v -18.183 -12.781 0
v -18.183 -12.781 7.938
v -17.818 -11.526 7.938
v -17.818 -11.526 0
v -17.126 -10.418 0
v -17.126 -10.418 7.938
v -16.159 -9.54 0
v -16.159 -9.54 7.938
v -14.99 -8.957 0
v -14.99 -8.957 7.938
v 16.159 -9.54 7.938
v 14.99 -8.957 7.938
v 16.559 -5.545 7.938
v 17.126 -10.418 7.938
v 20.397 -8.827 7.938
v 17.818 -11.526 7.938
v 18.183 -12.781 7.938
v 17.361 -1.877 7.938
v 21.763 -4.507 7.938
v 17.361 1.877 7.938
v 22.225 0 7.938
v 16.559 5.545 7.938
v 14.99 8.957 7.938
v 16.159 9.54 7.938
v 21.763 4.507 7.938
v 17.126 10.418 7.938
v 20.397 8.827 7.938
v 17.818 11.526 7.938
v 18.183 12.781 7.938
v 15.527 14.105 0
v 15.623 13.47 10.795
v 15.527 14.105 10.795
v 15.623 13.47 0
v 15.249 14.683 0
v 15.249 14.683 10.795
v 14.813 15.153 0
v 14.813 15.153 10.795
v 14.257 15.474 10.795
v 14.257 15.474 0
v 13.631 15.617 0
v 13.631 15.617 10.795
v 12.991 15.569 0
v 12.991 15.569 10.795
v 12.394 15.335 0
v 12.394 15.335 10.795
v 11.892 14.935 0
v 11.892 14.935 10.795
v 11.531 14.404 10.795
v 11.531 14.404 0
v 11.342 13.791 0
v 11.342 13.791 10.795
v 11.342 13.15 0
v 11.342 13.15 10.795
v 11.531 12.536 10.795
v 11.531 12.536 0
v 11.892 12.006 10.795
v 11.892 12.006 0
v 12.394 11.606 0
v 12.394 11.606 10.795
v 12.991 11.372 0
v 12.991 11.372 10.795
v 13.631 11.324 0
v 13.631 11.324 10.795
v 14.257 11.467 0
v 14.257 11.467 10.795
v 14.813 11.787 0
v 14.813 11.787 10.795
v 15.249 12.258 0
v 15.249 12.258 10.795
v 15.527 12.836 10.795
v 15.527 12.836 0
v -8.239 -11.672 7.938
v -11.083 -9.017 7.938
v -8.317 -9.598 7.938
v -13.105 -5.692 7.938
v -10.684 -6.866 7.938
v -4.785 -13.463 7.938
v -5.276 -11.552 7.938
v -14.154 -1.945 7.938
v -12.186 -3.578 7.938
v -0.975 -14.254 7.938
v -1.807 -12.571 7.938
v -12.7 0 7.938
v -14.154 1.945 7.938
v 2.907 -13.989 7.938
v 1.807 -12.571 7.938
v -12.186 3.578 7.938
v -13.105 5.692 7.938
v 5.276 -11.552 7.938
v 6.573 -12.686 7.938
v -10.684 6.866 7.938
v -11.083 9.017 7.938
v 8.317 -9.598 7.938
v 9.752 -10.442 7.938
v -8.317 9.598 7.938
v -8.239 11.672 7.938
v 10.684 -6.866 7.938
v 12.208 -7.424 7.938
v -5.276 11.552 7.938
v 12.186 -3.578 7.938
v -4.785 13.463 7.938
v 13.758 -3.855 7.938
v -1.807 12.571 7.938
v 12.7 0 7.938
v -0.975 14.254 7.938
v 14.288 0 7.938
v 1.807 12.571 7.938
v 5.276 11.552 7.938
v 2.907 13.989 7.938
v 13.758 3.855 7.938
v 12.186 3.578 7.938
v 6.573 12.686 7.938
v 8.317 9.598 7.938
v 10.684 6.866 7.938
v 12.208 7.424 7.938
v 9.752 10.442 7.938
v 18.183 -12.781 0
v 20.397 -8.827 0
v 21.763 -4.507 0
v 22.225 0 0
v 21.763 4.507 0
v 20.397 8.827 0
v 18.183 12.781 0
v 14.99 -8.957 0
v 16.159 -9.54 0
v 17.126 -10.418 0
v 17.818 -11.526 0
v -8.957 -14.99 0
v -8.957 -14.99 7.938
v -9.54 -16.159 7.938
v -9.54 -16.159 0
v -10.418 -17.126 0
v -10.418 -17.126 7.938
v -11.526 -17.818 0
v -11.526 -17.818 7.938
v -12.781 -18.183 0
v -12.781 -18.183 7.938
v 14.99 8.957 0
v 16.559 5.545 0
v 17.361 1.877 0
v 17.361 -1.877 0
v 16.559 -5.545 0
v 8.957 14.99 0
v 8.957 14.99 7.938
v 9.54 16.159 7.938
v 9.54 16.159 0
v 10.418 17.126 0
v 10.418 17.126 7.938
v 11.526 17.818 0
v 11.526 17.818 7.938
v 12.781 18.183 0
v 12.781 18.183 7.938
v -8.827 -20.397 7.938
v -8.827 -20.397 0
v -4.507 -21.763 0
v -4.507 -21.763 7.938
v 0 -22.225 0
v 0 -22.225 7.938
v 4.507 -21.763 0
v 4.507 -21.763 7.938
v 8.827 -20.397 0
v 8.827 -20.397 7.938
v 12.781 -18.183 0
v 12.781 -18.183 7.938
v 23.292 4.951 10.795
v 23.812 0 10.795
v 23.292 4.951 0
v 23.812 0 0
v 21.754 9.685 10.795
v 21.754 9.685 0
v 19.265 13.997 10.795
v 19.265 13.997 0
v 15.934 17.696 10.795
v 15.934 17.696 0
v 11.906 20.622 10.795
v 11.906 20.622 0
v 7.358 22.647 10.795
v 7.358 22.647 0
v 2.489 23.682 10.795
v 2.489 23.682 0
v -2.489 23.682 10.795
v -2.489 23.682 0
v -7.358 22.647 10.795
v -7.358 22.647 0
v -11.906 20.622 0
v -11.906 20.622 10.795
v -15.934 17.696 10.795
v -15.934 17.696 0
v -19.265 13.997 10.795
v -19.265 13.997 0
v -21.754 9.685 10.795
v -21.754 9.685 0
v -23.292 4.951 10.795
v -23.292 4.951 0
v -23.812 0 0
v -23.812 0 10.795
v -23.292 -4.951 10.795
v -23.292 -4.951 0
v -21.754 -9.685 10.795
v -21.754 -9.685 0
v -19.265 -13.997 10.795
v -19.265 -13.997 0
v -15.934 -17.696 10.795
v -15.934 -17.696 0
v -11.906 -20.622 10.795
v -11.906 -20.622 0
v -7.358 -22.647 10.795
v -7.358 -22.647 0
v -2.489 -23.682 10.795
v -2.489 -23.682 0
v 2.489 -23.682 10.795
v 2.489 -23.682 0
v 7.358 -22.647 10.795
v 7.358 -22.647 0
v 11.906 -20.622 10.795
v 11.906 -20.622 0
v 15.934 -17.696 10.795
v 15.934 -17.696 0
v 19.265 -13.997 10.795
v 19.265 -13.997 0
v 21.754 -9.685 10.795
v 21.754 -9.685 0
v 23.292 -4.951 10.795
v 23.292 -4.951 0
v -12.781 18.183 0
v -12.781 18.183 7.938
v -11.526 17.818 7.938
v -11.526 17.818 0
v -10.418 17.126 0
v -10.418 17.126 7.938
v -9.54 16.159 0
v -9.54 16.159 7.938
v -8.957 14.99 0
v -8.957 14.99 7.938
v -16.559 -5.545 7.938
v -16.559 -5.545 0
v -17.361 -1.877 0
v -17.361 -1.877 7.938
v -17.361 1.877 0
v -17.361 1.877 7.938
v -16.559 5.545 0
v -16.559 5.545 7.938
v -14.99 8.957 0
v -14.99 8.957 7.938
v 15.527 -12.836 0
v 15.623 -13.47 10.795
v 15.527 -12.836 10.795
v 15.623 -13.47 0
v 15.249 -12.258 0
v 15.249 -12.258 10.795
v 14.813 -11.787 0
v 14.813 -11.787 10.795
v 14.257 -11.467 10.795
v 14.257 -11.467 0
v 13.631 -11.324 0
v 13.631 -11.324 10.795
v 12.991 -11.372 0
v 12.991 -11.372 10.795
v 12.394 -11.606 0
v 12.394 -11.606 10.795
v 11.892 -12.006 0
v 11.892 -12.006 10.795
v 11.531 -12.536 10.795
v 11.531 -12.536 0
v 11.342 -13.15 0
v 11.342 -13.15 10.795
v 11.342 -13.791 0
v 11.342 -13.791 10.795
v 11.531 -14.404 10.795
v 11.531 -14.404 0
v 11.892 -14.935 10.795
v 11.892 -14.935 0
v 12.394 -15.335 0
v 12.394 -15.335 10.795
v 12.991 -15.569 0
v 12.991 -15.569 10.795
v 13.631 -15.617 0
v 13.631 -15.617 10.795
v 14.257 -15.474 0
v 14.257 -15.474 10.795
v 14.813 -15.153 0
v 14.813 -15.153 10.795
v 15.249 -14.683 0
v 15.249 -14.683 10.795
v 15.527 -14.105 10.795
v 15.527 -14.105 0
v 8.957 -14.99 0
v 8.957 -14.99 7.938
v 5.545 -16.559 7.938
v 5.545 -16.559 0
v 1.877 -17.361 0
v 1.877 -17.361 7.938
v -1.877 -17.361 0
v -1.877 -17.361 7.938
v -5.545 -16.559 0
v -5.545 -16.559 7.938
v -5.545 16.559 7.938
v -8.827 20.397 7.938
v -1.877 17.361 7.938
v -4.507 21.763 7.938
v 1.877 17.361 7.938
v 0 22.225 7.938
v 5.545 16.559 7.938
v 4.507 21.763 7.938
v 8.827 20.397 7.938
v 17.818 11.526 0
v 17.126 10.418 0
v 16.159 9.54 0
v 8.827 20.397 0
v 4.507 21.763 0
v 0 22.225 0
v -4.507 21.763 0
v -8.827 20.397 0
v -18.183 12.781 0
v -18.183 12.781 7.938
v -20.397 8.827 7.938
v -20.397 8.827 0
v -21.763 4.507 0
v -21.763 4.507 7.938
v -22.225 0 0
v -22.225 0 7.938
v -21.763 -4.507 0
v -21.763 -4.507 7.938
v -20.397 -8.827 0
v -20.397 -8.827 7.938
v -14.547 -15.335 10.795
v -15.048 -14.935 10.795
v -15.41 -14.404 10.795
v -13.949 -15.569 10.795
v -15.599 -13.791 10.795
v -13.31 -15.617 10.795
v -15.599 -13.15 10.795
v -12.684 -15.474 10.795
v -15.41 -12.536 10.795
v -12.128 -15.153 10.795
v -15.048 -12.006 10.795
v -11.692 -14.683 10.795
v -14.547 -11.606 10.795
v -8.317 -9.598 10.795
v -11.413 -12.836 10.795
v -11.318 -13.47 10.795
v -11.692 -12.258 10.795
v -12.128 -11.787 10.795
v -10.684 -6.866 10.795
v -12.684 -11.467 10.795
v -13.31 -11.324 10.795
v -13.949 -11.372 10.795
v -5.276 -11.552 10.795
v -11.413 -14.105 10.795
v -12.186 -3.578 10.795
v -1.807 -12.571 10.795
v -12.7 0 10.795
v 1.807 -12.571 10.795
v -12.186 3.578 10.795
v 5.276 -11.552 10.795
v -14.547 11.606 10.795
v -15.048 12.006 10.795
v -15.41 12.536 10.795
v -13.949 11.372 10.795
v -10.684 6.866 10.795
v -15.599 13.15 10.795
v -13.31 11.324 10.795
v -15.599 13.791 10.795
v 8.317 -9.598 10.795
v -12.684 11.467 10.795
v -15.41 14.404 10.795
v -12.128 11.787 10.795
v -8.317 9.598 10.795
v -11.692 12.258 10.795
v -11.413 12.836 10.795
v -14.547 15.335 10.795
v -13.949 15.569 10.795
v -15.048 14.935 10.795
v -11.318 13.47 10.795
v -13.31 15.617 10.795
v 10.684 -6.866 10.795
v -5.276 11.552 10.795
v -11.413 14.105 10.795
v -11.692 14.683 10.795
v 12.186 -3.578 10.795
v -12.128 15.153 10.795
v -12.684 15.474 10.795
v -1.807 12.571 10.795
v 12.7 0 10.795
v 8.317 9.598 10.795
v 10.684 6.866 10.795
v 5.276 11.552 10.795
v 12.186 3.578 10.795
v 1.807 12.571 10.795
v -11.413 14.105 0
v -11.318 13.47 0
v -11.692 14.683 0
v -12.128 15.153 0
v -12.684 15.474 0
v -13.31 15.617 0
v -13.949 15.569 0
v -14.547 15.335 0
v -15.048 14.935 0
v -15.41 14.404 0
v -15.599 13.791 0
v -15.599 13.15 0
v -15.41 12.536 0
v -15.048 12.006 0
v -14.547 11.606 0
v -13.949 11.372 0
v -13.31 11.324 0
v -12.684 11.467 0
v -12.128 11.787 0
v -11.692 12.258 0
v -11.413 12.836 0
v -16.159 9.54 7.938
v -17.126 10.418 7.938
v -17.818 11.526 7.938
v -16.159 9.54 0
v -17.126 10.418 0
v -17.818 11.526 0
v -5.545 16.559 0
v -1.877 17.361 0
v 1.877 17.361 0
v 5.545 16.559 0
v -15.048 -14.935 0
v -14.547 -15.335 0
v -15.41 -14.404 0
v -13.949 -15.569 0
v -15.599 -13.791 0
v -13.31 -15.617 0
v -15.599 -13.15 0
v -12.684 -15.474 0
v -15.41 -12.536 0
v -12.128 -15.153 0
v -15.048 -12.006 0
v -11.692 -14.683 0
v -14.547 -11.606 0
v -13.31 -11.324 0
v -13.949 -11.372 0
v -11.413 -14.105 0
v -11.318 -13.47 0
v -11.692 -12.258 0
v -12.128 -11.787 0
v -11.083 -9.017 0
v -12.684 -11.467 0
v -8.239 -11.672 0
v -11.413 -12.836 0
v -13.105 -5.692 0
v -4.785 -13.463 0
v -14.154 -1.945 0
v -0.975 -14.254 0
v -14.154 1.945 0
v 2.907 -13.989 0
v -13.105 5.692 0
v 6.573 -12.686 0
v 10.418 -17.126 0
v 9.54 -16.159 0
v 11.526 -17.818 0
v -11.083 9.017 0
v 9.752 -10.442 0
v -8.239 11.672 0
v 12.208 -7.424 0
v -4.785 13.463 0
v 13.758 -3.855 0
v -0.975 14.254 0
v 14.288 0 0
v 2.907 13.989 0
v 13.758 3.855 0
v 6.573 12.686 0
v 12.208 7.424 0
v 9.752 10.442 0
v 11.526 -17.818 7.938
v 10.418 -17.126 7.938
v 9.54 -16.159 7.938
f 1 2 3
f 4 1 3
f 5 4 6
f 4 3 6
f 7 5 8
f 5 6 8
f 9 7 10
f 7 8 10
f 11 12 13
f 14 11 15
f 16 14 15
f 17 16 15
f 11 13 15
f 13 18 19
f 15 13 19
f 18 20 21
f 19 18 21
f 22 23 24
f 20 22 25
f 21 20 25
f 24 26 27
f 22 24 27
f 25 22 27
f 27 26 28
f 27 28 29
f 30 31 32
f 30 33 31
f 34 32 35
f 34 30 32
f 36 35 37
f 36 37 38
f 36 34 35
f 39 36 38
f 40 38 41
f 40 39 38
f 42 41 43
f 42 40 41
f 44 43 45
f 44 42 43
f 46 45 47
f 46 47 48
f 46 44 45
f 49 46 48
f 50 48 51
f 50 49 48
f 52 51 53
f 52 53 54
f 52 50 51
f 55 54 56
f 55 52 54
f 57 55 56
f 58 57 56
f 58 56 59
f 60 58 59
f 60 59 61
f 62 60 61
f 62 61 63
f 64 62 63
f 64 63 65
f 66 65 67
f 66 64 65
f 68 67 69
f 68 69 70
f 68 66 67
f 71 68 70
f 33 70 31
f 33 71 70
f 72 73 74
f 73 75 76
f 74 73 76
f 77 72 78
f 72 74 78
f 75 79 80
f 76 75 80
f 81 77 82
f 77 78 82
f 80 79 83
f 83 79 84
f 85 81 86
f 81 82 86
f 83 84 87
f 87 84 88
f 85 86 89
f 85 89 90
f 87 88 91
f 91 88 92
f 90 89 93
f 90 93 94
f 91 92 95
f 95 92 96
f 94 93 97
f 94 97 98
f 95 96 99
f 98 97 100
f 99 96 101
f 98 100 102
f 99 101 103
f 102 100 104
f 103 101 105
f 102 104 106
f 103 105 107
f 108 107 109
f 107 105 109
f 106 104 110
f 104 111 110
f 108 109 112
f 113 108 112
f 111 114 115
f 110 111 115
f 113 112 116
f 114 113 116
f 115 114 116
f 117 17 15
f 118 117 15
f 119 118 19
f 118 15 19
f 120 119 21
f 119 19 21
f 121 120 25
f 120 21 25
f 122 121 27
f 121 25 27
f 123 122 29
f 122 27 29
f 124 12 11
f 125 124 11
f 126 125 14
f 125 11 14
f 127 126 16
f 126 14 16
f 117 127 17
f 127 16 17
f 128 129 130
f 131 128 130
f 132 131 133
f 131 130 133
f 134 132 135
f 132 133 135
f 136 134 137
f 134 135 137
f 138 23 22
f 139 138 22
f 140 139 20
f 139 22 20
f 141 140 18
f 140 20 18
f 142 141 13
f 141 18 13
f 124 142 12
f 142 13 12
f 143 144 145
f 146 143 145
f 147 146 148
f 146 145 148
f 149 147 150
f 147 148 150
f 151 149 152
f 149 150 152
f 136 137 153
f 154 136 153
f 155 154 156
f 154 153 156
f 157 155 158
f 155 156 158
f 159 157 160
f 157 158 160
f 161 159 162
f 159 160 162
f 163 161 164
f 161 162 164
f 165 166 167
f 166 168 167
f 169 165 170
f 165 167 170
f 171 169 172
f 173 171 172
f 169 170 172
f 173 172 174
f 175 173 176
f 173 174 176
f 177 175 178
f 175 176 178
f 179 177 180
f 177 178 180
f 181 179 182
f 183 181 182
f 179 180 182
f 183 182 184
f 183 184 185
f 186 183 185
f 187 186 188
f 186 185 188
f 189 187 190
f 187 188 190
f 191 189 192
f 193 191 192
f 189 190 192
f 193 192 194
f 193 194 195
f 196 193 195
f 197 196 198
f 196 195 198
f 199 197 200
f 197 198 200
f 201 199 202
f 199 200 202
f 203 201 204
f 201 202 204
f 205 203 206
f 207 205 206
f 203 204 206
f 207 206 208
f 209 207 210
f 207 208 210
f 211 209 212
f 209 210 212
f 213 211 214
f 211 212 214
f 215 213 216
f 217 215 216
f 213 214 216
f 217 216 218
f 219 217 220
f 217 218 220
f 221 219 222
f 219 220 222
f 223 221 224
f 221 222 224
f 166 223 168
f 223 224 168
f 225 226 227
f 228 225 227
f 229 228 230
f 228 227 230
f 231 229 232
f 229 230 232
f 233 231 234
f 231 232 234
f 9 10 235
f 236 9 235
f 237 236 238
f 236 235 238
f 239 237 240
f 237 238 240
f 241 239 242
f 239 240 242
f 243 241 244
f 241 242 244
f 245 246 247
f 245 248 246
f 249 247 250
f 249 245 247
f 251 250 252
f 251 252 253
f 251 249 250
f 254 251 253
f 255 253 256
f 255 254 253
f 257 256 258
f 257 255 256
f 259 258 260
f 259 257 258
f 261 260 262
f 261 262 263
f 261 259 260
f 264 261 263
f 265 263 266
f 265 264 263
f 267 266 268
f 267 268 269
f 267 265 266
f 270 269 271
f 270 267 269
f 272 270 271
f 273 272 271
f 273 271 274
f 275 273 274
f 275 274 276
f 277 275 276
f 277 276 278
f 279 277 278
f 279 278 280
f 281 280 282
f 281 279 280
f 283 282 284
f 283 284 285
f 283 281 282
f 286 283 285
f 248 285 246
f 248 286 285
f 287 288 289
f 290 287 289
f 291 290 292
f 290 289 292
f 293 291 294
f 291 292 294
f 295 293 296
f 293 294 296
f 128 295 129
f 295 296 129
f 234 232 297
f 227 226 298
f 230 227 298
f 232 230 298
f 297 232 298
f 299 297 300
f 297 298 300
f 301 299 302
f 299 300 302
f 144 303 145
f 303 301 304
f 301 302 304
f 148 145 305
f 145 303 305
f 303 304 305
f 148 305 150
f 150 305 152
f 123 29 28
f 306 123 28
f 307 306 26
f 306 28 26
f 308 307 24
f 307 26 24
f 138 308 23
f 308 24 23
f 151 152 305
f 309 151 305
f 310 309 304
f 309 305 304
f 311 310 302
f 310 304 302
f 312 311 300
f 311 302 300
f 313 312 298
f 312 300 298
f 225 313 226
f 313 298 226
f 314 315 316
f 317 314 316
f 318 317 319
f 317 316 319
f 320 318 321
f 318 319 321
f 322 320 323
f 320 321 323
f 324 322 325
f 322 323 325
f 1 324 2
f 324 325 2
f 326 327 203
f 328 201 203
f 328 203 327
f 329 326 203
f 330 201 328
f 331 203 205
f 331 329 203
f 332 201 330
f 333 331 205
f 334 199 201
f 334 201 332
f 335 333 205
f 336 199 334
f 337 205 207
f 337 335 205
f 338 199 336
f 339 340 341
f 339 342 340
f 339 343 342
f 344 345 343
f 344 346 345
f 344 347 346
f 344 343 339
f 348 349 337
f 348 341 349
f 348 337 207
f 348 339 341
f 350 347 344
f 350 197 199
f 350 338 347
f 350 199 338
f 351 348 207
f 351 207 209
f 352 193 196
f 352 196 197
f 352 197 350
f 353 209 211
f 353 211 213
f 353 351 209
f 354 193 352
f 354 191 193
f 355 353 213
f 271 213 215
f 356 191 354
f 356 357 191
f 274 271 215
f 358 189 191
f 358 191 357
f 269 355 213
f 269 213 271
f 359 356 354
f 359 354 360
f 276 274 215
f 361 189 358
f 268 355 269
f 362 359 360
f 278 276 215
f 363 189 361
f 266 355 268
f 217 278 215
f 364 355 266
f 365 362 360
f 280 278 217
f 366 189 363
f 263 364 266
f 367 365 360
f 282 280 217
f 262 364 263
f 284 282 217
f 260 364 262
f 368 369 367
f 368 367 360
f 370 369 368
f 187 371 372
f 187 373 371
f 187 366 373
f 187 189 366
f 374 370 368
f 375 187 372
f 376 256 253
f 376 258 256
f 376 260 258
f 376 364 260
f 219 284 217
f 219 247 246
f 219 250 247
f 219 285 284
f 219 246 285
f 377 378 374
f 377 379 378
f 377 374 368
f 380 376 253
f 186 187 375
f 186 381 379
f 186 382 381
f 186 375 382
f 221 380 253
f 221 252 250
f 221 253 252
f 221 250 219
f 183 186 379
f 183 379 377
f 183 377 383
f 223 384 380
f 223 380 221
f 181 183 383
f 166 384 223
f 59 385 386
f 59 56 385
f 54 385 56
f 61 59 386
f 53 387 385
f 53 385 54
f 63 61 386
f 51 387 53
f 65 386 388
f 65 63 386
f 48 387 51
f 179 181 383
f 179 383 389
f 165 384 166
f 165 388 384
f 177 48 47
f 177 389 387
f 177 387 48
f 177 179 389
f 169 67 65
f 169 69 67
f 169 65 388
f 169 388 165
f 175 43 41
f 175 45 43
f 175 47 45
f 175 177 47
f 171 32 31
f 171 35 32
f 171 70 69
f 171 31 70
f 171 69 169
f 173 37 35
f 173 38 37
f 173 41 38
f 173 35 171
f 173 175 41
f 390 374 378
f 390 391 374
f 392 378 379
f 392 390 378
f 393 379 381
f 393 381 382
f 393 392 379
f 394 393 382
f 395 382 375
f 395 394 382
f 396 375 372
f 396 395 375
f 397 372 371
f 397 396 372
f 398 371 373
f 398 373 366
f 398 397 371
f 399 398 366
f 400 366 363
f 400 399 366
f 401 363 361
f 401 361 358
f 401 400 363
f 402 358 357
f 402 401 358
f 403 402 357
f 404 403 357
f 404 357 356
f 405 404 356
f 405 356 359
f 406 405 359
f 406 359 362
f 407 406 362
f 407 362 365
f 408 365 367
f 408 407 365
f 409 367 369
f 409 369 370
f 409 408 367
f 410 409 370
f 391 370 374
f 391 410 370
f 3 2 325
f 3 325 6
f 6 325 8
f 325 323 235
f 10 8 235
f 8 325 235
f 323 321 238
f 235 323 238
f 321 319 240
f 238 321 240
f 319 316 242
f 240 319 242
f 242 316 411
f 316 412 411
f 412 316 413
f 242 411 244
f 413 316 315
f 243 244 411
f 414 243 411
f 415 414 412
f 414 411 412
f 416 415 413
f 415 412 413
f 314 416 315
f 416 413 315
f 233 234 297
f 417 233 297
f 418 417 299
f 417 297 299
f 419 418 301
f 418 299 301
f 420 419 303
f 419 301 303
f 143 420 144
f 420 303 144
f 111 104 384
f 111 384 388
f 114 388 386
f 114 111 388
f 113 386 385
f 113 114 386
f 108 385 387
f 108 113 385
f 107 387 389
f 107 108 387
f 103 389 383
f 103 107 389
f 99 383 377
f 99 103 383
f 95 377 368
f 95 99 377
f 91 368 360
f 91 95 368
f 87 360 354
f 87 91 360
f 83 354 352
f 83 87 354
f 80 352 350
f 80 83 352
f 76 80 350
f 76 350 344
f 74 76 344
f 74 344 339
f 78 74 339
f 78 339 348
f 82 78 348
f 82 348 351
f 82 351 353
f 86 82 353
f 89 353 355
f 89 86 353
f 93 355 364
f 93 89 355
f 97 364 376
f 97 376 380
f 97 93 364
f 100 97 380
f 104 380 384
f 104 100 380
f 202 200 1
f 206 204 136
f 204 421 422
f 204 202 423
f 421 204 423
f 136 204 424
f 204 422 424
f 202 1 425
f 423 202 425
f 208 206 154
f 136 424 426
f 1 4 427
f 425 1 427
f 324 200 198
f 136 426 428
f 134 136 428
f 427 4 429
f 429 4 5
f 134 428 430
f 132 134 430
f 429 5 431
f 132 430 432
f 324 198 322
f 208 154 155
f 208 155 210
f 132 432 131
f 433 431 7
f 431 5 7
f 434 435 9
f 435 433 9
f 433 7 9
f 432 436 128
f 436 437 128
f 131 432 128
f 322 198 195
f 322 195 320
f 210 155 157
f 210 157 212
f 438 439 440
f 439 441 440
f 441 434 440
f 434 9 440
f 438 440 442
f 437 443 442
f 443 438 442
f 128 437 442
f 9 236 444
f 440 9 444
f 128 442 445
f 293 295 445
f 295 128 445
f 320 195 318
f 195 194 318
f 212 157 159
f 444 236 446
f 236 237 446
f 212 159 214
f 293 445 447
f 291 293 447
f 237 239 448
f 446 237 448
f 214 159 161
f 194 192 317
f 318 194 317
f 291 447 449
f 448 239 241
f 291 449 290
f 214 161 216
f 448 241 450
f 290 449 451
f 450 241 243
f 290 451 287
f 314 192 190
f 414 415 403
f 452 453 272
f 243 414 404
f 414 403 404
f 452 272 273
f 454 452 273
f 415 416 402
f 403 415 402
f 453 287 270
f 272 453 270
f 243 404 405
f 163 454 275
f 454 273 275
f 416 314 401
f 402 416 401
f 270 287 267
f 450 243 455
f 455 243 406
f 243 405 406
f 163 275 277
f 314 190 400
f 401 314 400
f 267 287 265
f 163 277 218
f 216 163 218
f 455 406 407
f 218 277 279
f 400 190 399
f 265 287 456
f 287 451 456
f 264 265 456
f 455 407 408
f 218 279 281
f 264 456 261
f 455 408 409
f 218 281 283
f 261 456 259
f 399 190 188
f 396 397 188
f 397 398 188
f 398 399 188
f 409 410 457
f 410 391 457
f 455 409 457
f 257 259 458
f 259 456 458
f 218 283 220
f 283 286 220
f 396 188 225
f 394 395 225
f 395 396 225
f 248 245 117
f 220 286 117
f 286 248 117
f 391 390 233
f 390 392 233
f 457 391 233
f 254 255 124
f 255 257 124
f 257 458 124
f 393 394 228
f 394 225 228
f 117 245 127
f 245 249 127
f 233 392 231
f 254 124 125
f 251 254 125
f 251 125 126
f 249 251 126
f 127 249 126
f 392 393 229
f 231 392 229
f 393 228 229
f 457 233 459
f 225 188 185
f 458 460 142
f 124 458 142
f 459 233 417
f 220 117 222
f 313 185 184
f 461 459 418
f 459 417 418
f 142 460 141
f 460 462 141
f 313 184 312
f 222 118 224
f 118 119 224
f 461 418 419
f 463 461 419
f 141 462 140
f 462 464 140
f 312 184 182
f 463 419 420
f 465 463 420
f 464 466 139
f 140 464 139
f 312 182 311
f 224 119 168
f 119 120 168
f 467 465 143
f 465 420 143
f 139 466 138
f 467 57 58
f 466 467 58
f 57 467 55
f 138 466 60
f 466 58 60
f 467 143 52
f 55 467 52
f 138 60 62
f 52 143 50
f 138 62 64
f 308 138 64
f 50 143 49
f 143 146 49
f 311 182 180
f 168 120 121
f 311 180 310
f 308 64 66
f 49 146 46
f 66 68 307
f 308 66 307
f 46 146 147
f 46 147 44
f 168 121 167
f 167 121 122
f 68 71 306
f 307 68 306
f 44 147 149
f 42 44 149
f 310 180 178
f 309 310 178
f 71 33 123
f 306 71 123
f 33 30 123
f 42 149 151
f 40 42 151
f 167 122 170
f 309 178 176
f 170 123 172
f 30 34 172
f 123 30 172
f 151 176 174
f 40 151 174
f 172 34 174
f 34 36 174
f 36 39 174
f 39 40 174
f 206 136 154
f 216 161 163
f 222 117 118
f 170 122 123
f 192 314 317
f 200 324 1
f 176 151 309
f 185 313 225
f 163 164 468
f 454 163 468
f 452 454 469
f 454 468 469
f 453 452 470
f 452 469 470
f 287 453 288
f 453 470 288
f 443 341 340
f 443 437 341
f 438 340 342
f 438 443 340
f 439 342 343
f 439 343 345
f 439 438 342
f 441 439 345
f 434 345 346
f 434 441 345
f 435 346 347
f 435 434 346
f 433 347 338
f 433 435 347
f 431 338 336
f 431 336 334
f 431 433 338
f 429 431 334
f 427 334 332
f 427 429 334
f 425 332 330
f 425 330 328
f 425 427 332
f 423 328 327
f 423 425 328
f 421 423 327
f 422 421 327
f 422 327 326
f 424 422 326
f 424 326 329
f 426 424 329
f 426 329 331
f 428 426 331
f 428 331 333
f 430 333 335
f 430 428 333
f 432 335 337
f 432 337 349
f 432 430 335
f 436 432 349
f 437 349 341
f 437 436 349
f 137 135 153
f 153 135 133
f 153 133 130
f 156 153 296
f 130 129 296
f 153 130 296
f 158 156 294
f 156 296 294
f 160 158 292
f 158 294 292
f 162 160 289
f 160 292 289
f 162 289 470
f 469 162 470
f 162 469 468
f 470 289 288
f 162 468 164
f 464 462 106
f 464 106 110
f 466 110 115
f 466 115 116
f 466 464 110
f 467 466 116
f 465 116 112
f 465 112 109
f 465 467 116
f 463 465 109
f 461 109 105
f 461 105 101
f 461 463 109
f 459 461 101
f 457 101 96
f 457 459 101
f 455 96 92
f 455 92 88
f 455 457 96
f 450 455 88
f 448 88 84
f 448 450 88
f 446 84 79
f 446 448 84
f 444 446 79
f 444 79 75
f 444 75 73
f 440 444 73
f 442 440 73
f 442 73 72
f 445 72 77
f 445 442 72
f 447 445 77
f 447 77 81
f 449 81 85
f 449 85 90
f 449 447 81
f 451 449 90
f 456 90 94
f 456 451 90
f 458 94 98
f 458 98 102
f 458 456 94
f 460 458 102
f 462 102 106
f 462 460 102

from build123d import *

# Parameters (mm, degrees)
F0_R            = 23.8125
F0_R_2          = 2.15265
F0_R_3          = 14.2875
F1_DEPTH        = 7.9375
F3_DEPTH        = 7.9375
F3_COPIES_COUNT = 4
F4_R            = 23.8125
F4_R_2          = 2.15265
F4_R_3          = 14.2875
F4_R_4          = 12.7
F5_DEPTH        = 2.8575


# Not quite as in the source:
# - a pattern or mirror of a feature is missing from the dataset's text; its kind, count and spacing are read off the source's solid


with BuildPart() as f1:
    # F0 (on Top) → F1 (new body)
    with BuildSketch(Plane.XY):
        Circle(F0_R)
        with Locations((-13.4703841816, -13.4703841816)):
            Circle(F0_R_2, mode=Mode.SUBTRACT)
        with Locations((13.4703841816, -13.4703841816)):
            Circle(F0_R_2, mode=Mode.SUBTRACT)
        with Locations((-13.4703841816, 13.4703841816)):
            Circle(F0_R_2, mode=Mode.SUBTRACT)
        Circle(F0_R_3, mode=Mode.SUBTRACT)
        with Locations((13.4703841816, 13.4703841816)):
            Circle(F0_R_2, mode=Mode.SUBTRACT)
    extrude(amount=F1_DEPTH)

    # F2 (on face) → F3 (cut, through all)
    with BuildSketch(Plane.XY.offset(7.9375)):
        with BuildLine():
            ThreePointArc((12.7805200237, -18.1826547271), (10.4181406182, -17.1262309344), (8.9569606825, -14.9903889737))
            ThreePointArc((8.9569606825, -14.9903889737), (0, -17.4625), (-8.9569606825, -14.9903889737))
            ThreePointArc((-8.9569606825, -14.9903889737), (-10.4181406182, -17.1262309344), (-12.7805200237, -18.1826547271))
            ThreePointArc((-12.7805200237, -18.1826547271), (0, -22.225), (12.7805200237, -18.1826547271))
        make_face()
    f3 = extrude(amount=-F3_DEPTH, mode=Mode.SUBTRACT)

    # F3_copies: F3 ×4 about axis
    f3_copies_axis = Axis((0, 0, 0), (0, 0, 1))
    for i in range(1, F3_COPIES_COUNT):
        add(f3.rotate(f3_copies_axis, i * 360 / F3_COPIES_COUNT), mode=Mode.SUBTRACT)

    # F4 (on face) → F5 (join)
    with BuildSketch(Plane.XY.offset(7.9375)):
        Circle(F4_R)
        with Locations((-13.4703841816, -13.4703841816)):
            Circle(F4_R_2, mode=Mode.SUBTRACT)
        with BuildLine():
            ThreePointArc((-8.9569606825, -14.9903889737), (0, -17.4625), (8.9569606825, -14.9903889737))
            ThreePointArc((8.9569606825, -14.9903889737), (10.4181406182, -17.1262309344), (12.7805200237, -18.1826547271))
            ThreePointArc((12.7805200237, -18.1826547271), (0, -22.225), (-12.7805200237, -18.1826547271))
            ThreePointArc((-12.7805200237, -18.1826547271), (-10.4181406182, -17.1262309344), (-8.9569606825, -14.9903889737))
        make_face(mode=Mode.SUBTRACT)
        with Locations((13.4703841816, -13.4703841816)):
            Circle(F4_R_2, mode=Mode.SUBTRACT)
        with BuildLine():
            ThreePointArc((-14.9903889737, 8.9569606825), (-17.4625, 0), (-14.9903889737, -8.9569606825))
            ThreePointArc((-14.9903889737, -8.9569606825), (-17.1262309344, -10.4181406182), (-18.1826547271, -12.7805200237))
            ThreePointArc((-18.1826547271, -12.7805200237), (-22.225, 0), (-18.1826547271, 12.7805200237))
            ThreePointArc((-18.1826547271, 12.7805200237), (-17.1262309344, 10.4181406182), (-14.9903889737, 8.9569606825))
        make_face(mode=Mode.SUBTRACT)
        with Locations((-13.4703841816, 13.4703841816)):
            Circle(F4_R_2, mode=Mode.SUBTRACT)
        Circle(F4_R_3, mode=Mode.SUBTRACT)
        with BuildLine():
            ThreePointArc((14.9903889737, -8.9569606825), (17.4625, 0), (14.9903889737, 8.9569606825))
            ThreePointArc((14.9903889737, 8.9569606825), (17.1262309344, 10.4181406182), (18.1826547271, 12.7805200237))
            ThreePointArc((18.1826547271, 12.7805200237), (22.225, 0), (18.1826547271, -12.7805200237))
            ThreePointArc((18.1826547271, -12.7805200237), (17.1262309344, -10.4181406182), (14.9903889737, -8.9569606825))
        make_face(mode=Mode.SUBTRACT)
        with BuildLine():
            ThreePointArc((8.9569606825, 14.9903889737), (0, 17.4625), (-8.9569606825, 14.9903889737))
            ThreePointArc((-8.9569606825, 14.9903889737), (-10.4181406182, 17.1262309344), (-12.7805200237, 18.1826547271))
            ThreePointArc((-12.7805200237, 18.1826547271), (0, 22.225), (12.7805200237, 18.1826547271))
            ThreePointArc((12.7805200237, 18.1826547271), (10.4181406182, 17.1262309344), (8.9569606825, 14.9903889737))
        make_face(mode=Mode.SUBTRACT)
        with Locations((13.4703841816, 13.4703841816)):
            Circle(F4_R_2, mode=Mode.SUBTRACT)
        with BuildLine():
            ThreePointArc((12.7805200237, -18.1826547271), (10.4181406182, -17.1262309344), (8.9569606825, -14.9903889737))
            ThreePointArc((8.9569606825, -14.9903889737), (0, -17.4625), (-8.9569606825, -14.9903889737))
            ThreePointArc((-8.9569606825, -14.9903889737), (-10.4181406182, -17.1262309344), (-12.7805200237, -18.1826547271))
            ThreePointArc((-12.7805200237, -18.1826547271), (0, -22.225), (12.7805200237, -18.1826547271))
        make_face()
        with BuildLine():
            ThreePointArc((-18.1826547271, -12.7805200237), (-17.1262309344, -10.4181406182), (-14.9903889737, -8.9569606825))
            ThreePointArc((-14.9903889737, -8.9569606825), (-17.4625, 0), (-14.9903889737, 8.9569606825))
            ThreePointArc((-14.9903889737, 8.9569606825), (-17.1262309344, 10.4181406182), (-18.1826547271, 12.7805200237))
            ThreePointArc((-18.1826547271, 12.7805200237), (-22.225, 0), (-18.1826547271, -12.7805200237))
        make_face()
        Circle(F4_R_3)
        Circle(F4_R_4, mode=Mode.SUBTRACT)
        with BuildLine():
            ThreePointArc((18.1826547271, 12.7805200237), (17.1262309344, 10.4181406182), (14.9903889737, 8.9569606825))
            ThreePointArc((14.9903889737, 8.9569606825), (17.4625, 0), (14.9903889737, -8.9569606825))
            ThreePointArc((14.9903889737, -8.9569606825), (17.1262309344, -10.4181406182), (18.1826547271, -12.7805200237))
            ThreePointArc((18.1826547271, -12.7805200237), (22.225, 0), (18.1826547271, 12.7805200237))
        make_face()
        with BuildLine():
            ThreePointArc((-12.7805200237, 18.1826547271), (-10.4181406182, 17.1262309344), (-8.9569606825, 14.9903889737))
            ThreePointArc((-8.9569606825, 14.9903889737), (0, 17.4625), (8.9569606825, 14.9903889737))
            ThreePointArc((8.9569606825, 14.9903889737), (10.4181406182, 17.1262309344), (12.7805200237, 18.1826547271))
            ThreePointArc((12.7805200237, 18.1826547271), (0, 22.225), (-12.7805200237, 18.1826547271))
        make_face()
    extrude(amount=F5_DEPTH)


solid = f1.part
